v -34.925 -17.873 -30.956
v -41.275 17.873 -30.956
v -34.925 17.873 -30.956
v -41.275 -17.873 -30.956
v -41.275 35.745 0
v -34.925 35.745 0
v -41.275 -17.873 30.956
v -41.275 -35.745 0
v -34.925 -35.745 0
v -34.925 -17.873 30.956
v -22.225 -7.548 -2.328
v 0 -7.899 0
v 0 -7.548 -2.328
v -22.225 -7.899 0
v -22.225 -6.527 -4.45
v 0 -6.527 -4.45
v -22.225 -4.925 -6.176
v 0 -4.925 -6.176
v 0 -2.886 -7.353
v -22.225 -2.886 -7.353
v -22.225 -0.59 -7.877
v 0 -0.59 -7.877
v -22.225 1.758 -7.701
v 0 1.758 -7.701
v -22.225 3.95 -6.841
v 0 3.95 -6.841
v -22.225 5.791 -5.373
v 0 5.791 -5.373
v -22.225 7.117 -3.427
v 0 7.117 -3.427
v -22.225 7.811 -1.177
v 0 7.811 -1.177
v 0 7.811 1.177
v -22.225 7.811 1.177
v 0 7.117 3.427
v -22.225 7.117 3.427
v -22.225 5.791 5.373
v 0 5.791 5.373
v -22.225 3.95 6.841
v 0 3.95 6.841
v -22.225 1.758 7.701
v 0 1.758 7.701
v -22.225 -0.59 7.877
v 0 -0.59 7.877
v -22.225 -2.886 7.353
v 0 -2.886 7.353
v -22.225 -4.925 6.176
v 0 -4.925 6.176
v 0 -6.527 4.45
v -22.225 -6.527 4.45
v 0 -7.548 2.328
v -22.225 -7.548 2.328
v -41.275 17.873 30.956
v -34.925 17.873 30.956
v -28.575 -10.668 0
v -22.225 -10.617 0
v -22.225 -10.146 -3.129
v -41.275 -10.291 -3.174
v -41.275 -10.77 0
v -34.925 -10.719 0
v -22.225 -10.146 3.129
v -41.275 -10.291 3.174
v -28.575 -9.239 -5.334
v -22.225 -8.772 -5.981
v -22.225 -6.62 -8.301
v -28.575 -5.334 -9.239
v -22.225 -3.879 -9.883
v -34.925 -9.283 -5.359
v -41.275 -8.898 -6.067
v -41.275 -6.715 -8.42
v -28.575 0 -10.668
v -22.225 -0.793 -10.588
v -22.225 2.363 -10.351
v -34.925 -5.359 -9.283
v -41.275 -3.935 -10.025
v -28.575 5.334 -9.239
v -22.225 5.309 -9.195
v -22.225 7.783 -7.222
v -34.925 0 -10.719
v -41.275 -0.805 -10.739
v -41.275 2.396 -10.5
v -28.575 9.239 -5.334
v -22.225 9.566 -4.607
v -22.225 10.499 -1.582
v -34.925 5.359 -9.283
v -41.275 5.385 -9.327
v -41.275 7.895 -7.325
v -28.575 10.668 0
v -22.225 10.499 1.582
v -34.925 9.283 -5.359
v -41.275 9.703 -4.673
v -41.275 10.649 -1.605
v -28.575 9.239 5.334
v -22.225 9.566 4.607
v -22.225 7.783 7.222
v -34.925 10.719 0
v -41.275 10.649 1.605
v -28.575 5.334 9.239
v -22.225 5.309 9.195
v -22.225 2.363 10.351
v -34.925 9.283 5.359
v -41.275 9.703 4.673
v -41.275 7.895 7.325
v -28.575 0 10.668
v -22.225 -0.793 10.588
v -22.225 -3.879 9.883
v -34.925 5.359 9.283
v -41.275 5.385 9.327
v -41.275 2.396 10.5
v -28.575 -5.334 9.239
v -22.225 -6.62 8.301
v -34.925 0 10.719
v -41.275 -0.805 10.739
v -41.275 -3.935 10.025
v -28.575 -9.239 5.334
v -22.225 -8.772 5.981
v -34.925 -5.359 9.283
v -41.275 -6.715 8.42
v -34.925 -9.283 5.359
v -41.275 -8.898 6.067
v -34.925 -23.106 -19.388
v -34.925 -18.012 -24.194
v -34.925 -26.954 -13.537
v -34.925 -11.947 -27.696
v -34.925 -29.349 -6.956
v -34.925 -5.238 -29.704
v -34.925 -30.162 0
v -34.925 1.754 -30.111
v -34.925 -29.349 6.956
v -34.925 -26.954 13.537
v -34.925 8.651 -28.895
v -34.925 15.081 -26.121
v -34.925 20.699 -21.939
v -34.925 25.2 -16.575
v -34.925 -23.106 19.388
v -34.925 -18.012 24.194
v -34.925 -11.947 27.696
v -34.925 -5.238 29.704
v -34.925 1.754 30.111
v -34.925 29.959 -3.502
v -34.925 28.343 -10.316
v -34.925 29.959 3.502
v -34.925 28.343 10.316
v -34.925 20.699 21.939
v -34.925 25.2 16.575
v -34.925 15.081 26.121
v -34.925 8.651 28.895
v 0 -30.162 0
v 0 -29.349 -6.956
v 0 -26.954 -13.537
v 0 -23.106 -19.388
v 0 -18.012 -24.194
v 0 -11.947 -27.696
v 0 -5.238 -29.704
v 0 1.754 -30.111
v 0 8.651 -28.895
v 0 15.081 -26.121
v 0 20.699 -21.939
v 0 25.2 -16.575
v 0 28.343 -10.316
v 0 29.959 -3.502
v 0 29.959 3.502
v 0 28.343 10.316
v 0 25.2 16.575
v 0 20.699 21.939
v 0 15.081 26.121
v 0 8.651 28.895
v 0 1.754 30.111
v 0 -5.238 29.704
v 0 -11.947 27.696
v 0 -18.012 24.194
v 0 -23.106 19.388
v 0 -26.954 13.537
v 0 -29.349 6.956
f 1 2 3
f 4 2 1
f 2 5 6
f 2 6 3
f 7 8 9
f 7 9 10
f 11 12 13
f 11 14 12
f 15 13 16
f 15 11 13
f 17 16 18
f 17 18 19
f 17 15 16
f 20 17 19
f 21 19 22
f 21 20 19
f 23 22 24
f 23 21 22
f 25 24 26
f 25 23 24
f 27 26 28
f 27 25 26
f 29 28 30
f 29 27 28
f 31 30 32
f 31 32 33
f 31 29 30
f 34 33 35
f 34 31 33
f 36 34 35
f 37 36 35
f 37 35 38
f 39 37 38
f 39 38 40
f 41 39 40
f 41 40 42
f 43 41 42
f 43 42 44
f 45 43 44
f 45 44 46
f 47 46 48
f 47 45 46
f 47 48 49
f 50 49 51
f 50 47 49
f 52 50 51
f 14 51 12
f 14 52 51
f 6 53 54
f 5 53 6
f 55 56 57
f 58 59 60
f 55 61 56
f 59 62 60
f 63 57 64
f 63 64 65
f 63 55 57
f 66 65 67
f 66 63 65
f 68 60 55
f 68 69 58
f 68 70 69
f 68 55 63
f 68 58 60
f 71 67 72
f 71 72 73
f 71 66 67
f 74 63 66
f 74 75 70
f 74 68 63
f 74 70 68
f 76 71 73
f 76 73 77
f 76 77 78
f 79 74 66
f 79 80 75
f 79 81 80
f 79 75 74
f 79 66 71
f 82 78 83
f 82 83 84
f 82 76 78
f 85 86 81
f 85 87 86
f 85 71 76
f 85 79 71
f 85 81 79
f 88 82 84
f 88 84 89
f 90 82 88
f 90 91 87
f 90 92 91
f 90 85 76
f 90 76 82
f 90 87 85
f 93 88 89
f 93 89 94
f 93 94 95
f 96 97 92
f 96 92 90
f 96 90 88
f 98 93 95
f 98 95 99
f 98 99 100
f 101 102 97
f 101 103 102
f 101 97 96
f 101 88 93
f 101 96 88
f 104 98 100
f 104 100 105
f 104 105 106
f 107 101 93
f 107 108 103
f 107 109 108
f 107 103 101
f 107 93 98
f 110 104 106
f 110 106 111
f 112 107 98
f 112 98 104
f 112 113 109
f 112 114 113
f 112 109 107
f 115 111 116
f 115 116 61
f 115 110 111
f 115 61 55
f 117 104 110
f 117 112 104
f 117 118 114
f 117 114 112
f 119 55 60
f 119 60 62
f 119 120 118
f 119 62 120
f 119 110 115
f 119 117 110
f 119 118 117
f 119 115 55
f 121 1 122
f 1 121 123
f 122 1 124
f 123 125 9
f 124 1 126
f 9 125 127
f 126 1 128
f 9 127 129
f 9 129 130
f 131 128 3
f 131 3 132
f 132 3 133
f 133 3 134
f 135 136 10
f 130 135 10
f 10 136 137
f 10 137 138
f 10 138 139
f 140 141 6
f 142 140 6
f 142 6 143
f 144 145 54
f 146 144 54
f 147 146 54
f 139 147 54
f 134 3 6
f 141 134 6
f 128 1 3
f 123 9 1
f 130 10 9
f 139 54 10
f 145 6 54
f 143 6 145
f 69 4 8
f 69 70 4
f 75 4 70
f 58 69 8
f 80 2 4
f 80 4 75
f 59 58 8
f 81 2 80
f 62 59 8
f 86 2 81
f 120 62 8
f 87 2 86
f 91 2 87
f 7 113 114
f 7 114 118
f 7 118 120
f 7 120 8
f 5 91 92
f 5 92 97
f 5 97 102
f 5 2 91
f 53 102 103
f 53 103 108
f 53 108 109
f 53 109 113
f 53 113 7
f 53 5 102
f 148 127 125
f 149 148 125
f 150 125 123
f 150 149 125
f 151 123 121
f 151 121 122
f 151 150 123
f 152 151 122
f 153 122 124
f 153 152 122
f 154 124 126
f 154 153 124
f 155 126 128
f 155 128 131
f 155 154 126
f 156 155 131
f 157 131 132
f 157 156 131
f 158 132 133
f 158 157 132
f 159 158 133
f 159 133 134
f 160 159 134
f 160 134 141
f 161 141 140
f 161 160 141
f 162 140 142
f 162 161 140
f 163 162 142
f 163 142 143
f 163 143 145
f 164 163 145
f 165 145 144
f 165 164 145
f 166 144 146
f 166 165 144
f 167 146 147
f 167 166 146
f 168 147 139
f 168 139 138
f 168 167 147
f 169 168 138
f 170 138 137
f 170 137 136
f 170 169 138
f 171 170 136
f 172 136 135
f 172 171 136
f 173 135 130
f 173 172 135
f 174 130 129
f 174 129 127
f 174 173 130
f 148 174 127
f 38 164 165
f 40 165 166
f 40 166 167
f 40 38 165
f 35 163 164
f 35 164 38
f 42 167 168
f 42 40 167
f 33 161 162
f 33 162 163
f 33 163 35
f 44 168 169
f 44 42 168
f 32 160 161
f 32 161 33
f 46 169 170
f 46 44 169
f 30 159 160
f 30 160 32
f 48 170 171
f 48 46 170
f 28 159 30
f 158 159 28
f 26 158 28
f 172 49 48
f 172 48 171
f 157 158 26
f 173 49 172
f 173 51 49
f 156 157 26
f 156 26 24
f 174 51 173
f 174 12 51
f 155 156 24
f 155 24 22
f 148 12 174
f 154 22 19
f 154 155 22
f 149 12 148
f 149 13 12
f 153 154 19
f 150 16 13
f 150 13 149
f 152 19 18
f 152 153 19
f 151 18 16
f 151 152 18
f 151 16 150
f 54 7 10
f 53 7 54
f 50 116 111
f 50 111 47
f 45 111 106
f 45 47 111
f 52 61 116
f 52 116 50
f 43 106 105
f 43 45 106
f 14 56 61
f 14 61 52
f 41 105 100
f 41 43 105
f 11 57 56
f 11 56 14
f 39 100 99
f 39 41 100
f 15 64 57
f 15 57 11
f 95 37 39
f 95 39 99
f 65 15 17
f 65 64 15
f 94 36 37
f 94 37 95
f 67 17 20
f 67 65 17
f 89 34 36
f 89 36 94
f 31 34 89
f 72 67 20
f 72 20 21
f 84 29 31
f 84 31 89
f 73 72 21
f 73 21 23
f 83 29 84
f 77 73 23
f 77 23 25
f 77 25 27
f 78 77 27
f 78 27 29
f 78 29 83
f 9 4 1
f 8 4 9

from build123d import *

# Parameters (mm, degrees)
SKETCH2_R           = 10.7696
BOSS_EXTRUDE1_DEPTH = 6.35


with BuildPart() as part:
    # Sketch1 → Revolve1 (revolve)
    with BuildSketch(Plane.XY):
        Polygon((-41.275, -30.1625), (0, -30.1625), (0, -7.8994), (-22.225, -7.8994), (-22.225, -10.6172), (-41.275, -10.7696), align=None)
    revolve(axis=Axis((-41.275, 0, 0), (1, 0, 0)))

    # Sketch2 → Boss-Extrude1 (add)
    with BuildSketch(Plane.ZY.offset(41.275)):
        Polygon((0, 35.745198541), (-30.95625, 17.872599271), (-30.95625, -17.872599271), (0, -35.745198541), (30.95625, -17.872599271), (30.95625, 17.872599271), align=None)
        Circle(SKETCH2_R, mode=Mode.SUBTRACT)
    extrude(amount=-BOSS_EXTRUDE1_DEPTH)


solid = part.part
